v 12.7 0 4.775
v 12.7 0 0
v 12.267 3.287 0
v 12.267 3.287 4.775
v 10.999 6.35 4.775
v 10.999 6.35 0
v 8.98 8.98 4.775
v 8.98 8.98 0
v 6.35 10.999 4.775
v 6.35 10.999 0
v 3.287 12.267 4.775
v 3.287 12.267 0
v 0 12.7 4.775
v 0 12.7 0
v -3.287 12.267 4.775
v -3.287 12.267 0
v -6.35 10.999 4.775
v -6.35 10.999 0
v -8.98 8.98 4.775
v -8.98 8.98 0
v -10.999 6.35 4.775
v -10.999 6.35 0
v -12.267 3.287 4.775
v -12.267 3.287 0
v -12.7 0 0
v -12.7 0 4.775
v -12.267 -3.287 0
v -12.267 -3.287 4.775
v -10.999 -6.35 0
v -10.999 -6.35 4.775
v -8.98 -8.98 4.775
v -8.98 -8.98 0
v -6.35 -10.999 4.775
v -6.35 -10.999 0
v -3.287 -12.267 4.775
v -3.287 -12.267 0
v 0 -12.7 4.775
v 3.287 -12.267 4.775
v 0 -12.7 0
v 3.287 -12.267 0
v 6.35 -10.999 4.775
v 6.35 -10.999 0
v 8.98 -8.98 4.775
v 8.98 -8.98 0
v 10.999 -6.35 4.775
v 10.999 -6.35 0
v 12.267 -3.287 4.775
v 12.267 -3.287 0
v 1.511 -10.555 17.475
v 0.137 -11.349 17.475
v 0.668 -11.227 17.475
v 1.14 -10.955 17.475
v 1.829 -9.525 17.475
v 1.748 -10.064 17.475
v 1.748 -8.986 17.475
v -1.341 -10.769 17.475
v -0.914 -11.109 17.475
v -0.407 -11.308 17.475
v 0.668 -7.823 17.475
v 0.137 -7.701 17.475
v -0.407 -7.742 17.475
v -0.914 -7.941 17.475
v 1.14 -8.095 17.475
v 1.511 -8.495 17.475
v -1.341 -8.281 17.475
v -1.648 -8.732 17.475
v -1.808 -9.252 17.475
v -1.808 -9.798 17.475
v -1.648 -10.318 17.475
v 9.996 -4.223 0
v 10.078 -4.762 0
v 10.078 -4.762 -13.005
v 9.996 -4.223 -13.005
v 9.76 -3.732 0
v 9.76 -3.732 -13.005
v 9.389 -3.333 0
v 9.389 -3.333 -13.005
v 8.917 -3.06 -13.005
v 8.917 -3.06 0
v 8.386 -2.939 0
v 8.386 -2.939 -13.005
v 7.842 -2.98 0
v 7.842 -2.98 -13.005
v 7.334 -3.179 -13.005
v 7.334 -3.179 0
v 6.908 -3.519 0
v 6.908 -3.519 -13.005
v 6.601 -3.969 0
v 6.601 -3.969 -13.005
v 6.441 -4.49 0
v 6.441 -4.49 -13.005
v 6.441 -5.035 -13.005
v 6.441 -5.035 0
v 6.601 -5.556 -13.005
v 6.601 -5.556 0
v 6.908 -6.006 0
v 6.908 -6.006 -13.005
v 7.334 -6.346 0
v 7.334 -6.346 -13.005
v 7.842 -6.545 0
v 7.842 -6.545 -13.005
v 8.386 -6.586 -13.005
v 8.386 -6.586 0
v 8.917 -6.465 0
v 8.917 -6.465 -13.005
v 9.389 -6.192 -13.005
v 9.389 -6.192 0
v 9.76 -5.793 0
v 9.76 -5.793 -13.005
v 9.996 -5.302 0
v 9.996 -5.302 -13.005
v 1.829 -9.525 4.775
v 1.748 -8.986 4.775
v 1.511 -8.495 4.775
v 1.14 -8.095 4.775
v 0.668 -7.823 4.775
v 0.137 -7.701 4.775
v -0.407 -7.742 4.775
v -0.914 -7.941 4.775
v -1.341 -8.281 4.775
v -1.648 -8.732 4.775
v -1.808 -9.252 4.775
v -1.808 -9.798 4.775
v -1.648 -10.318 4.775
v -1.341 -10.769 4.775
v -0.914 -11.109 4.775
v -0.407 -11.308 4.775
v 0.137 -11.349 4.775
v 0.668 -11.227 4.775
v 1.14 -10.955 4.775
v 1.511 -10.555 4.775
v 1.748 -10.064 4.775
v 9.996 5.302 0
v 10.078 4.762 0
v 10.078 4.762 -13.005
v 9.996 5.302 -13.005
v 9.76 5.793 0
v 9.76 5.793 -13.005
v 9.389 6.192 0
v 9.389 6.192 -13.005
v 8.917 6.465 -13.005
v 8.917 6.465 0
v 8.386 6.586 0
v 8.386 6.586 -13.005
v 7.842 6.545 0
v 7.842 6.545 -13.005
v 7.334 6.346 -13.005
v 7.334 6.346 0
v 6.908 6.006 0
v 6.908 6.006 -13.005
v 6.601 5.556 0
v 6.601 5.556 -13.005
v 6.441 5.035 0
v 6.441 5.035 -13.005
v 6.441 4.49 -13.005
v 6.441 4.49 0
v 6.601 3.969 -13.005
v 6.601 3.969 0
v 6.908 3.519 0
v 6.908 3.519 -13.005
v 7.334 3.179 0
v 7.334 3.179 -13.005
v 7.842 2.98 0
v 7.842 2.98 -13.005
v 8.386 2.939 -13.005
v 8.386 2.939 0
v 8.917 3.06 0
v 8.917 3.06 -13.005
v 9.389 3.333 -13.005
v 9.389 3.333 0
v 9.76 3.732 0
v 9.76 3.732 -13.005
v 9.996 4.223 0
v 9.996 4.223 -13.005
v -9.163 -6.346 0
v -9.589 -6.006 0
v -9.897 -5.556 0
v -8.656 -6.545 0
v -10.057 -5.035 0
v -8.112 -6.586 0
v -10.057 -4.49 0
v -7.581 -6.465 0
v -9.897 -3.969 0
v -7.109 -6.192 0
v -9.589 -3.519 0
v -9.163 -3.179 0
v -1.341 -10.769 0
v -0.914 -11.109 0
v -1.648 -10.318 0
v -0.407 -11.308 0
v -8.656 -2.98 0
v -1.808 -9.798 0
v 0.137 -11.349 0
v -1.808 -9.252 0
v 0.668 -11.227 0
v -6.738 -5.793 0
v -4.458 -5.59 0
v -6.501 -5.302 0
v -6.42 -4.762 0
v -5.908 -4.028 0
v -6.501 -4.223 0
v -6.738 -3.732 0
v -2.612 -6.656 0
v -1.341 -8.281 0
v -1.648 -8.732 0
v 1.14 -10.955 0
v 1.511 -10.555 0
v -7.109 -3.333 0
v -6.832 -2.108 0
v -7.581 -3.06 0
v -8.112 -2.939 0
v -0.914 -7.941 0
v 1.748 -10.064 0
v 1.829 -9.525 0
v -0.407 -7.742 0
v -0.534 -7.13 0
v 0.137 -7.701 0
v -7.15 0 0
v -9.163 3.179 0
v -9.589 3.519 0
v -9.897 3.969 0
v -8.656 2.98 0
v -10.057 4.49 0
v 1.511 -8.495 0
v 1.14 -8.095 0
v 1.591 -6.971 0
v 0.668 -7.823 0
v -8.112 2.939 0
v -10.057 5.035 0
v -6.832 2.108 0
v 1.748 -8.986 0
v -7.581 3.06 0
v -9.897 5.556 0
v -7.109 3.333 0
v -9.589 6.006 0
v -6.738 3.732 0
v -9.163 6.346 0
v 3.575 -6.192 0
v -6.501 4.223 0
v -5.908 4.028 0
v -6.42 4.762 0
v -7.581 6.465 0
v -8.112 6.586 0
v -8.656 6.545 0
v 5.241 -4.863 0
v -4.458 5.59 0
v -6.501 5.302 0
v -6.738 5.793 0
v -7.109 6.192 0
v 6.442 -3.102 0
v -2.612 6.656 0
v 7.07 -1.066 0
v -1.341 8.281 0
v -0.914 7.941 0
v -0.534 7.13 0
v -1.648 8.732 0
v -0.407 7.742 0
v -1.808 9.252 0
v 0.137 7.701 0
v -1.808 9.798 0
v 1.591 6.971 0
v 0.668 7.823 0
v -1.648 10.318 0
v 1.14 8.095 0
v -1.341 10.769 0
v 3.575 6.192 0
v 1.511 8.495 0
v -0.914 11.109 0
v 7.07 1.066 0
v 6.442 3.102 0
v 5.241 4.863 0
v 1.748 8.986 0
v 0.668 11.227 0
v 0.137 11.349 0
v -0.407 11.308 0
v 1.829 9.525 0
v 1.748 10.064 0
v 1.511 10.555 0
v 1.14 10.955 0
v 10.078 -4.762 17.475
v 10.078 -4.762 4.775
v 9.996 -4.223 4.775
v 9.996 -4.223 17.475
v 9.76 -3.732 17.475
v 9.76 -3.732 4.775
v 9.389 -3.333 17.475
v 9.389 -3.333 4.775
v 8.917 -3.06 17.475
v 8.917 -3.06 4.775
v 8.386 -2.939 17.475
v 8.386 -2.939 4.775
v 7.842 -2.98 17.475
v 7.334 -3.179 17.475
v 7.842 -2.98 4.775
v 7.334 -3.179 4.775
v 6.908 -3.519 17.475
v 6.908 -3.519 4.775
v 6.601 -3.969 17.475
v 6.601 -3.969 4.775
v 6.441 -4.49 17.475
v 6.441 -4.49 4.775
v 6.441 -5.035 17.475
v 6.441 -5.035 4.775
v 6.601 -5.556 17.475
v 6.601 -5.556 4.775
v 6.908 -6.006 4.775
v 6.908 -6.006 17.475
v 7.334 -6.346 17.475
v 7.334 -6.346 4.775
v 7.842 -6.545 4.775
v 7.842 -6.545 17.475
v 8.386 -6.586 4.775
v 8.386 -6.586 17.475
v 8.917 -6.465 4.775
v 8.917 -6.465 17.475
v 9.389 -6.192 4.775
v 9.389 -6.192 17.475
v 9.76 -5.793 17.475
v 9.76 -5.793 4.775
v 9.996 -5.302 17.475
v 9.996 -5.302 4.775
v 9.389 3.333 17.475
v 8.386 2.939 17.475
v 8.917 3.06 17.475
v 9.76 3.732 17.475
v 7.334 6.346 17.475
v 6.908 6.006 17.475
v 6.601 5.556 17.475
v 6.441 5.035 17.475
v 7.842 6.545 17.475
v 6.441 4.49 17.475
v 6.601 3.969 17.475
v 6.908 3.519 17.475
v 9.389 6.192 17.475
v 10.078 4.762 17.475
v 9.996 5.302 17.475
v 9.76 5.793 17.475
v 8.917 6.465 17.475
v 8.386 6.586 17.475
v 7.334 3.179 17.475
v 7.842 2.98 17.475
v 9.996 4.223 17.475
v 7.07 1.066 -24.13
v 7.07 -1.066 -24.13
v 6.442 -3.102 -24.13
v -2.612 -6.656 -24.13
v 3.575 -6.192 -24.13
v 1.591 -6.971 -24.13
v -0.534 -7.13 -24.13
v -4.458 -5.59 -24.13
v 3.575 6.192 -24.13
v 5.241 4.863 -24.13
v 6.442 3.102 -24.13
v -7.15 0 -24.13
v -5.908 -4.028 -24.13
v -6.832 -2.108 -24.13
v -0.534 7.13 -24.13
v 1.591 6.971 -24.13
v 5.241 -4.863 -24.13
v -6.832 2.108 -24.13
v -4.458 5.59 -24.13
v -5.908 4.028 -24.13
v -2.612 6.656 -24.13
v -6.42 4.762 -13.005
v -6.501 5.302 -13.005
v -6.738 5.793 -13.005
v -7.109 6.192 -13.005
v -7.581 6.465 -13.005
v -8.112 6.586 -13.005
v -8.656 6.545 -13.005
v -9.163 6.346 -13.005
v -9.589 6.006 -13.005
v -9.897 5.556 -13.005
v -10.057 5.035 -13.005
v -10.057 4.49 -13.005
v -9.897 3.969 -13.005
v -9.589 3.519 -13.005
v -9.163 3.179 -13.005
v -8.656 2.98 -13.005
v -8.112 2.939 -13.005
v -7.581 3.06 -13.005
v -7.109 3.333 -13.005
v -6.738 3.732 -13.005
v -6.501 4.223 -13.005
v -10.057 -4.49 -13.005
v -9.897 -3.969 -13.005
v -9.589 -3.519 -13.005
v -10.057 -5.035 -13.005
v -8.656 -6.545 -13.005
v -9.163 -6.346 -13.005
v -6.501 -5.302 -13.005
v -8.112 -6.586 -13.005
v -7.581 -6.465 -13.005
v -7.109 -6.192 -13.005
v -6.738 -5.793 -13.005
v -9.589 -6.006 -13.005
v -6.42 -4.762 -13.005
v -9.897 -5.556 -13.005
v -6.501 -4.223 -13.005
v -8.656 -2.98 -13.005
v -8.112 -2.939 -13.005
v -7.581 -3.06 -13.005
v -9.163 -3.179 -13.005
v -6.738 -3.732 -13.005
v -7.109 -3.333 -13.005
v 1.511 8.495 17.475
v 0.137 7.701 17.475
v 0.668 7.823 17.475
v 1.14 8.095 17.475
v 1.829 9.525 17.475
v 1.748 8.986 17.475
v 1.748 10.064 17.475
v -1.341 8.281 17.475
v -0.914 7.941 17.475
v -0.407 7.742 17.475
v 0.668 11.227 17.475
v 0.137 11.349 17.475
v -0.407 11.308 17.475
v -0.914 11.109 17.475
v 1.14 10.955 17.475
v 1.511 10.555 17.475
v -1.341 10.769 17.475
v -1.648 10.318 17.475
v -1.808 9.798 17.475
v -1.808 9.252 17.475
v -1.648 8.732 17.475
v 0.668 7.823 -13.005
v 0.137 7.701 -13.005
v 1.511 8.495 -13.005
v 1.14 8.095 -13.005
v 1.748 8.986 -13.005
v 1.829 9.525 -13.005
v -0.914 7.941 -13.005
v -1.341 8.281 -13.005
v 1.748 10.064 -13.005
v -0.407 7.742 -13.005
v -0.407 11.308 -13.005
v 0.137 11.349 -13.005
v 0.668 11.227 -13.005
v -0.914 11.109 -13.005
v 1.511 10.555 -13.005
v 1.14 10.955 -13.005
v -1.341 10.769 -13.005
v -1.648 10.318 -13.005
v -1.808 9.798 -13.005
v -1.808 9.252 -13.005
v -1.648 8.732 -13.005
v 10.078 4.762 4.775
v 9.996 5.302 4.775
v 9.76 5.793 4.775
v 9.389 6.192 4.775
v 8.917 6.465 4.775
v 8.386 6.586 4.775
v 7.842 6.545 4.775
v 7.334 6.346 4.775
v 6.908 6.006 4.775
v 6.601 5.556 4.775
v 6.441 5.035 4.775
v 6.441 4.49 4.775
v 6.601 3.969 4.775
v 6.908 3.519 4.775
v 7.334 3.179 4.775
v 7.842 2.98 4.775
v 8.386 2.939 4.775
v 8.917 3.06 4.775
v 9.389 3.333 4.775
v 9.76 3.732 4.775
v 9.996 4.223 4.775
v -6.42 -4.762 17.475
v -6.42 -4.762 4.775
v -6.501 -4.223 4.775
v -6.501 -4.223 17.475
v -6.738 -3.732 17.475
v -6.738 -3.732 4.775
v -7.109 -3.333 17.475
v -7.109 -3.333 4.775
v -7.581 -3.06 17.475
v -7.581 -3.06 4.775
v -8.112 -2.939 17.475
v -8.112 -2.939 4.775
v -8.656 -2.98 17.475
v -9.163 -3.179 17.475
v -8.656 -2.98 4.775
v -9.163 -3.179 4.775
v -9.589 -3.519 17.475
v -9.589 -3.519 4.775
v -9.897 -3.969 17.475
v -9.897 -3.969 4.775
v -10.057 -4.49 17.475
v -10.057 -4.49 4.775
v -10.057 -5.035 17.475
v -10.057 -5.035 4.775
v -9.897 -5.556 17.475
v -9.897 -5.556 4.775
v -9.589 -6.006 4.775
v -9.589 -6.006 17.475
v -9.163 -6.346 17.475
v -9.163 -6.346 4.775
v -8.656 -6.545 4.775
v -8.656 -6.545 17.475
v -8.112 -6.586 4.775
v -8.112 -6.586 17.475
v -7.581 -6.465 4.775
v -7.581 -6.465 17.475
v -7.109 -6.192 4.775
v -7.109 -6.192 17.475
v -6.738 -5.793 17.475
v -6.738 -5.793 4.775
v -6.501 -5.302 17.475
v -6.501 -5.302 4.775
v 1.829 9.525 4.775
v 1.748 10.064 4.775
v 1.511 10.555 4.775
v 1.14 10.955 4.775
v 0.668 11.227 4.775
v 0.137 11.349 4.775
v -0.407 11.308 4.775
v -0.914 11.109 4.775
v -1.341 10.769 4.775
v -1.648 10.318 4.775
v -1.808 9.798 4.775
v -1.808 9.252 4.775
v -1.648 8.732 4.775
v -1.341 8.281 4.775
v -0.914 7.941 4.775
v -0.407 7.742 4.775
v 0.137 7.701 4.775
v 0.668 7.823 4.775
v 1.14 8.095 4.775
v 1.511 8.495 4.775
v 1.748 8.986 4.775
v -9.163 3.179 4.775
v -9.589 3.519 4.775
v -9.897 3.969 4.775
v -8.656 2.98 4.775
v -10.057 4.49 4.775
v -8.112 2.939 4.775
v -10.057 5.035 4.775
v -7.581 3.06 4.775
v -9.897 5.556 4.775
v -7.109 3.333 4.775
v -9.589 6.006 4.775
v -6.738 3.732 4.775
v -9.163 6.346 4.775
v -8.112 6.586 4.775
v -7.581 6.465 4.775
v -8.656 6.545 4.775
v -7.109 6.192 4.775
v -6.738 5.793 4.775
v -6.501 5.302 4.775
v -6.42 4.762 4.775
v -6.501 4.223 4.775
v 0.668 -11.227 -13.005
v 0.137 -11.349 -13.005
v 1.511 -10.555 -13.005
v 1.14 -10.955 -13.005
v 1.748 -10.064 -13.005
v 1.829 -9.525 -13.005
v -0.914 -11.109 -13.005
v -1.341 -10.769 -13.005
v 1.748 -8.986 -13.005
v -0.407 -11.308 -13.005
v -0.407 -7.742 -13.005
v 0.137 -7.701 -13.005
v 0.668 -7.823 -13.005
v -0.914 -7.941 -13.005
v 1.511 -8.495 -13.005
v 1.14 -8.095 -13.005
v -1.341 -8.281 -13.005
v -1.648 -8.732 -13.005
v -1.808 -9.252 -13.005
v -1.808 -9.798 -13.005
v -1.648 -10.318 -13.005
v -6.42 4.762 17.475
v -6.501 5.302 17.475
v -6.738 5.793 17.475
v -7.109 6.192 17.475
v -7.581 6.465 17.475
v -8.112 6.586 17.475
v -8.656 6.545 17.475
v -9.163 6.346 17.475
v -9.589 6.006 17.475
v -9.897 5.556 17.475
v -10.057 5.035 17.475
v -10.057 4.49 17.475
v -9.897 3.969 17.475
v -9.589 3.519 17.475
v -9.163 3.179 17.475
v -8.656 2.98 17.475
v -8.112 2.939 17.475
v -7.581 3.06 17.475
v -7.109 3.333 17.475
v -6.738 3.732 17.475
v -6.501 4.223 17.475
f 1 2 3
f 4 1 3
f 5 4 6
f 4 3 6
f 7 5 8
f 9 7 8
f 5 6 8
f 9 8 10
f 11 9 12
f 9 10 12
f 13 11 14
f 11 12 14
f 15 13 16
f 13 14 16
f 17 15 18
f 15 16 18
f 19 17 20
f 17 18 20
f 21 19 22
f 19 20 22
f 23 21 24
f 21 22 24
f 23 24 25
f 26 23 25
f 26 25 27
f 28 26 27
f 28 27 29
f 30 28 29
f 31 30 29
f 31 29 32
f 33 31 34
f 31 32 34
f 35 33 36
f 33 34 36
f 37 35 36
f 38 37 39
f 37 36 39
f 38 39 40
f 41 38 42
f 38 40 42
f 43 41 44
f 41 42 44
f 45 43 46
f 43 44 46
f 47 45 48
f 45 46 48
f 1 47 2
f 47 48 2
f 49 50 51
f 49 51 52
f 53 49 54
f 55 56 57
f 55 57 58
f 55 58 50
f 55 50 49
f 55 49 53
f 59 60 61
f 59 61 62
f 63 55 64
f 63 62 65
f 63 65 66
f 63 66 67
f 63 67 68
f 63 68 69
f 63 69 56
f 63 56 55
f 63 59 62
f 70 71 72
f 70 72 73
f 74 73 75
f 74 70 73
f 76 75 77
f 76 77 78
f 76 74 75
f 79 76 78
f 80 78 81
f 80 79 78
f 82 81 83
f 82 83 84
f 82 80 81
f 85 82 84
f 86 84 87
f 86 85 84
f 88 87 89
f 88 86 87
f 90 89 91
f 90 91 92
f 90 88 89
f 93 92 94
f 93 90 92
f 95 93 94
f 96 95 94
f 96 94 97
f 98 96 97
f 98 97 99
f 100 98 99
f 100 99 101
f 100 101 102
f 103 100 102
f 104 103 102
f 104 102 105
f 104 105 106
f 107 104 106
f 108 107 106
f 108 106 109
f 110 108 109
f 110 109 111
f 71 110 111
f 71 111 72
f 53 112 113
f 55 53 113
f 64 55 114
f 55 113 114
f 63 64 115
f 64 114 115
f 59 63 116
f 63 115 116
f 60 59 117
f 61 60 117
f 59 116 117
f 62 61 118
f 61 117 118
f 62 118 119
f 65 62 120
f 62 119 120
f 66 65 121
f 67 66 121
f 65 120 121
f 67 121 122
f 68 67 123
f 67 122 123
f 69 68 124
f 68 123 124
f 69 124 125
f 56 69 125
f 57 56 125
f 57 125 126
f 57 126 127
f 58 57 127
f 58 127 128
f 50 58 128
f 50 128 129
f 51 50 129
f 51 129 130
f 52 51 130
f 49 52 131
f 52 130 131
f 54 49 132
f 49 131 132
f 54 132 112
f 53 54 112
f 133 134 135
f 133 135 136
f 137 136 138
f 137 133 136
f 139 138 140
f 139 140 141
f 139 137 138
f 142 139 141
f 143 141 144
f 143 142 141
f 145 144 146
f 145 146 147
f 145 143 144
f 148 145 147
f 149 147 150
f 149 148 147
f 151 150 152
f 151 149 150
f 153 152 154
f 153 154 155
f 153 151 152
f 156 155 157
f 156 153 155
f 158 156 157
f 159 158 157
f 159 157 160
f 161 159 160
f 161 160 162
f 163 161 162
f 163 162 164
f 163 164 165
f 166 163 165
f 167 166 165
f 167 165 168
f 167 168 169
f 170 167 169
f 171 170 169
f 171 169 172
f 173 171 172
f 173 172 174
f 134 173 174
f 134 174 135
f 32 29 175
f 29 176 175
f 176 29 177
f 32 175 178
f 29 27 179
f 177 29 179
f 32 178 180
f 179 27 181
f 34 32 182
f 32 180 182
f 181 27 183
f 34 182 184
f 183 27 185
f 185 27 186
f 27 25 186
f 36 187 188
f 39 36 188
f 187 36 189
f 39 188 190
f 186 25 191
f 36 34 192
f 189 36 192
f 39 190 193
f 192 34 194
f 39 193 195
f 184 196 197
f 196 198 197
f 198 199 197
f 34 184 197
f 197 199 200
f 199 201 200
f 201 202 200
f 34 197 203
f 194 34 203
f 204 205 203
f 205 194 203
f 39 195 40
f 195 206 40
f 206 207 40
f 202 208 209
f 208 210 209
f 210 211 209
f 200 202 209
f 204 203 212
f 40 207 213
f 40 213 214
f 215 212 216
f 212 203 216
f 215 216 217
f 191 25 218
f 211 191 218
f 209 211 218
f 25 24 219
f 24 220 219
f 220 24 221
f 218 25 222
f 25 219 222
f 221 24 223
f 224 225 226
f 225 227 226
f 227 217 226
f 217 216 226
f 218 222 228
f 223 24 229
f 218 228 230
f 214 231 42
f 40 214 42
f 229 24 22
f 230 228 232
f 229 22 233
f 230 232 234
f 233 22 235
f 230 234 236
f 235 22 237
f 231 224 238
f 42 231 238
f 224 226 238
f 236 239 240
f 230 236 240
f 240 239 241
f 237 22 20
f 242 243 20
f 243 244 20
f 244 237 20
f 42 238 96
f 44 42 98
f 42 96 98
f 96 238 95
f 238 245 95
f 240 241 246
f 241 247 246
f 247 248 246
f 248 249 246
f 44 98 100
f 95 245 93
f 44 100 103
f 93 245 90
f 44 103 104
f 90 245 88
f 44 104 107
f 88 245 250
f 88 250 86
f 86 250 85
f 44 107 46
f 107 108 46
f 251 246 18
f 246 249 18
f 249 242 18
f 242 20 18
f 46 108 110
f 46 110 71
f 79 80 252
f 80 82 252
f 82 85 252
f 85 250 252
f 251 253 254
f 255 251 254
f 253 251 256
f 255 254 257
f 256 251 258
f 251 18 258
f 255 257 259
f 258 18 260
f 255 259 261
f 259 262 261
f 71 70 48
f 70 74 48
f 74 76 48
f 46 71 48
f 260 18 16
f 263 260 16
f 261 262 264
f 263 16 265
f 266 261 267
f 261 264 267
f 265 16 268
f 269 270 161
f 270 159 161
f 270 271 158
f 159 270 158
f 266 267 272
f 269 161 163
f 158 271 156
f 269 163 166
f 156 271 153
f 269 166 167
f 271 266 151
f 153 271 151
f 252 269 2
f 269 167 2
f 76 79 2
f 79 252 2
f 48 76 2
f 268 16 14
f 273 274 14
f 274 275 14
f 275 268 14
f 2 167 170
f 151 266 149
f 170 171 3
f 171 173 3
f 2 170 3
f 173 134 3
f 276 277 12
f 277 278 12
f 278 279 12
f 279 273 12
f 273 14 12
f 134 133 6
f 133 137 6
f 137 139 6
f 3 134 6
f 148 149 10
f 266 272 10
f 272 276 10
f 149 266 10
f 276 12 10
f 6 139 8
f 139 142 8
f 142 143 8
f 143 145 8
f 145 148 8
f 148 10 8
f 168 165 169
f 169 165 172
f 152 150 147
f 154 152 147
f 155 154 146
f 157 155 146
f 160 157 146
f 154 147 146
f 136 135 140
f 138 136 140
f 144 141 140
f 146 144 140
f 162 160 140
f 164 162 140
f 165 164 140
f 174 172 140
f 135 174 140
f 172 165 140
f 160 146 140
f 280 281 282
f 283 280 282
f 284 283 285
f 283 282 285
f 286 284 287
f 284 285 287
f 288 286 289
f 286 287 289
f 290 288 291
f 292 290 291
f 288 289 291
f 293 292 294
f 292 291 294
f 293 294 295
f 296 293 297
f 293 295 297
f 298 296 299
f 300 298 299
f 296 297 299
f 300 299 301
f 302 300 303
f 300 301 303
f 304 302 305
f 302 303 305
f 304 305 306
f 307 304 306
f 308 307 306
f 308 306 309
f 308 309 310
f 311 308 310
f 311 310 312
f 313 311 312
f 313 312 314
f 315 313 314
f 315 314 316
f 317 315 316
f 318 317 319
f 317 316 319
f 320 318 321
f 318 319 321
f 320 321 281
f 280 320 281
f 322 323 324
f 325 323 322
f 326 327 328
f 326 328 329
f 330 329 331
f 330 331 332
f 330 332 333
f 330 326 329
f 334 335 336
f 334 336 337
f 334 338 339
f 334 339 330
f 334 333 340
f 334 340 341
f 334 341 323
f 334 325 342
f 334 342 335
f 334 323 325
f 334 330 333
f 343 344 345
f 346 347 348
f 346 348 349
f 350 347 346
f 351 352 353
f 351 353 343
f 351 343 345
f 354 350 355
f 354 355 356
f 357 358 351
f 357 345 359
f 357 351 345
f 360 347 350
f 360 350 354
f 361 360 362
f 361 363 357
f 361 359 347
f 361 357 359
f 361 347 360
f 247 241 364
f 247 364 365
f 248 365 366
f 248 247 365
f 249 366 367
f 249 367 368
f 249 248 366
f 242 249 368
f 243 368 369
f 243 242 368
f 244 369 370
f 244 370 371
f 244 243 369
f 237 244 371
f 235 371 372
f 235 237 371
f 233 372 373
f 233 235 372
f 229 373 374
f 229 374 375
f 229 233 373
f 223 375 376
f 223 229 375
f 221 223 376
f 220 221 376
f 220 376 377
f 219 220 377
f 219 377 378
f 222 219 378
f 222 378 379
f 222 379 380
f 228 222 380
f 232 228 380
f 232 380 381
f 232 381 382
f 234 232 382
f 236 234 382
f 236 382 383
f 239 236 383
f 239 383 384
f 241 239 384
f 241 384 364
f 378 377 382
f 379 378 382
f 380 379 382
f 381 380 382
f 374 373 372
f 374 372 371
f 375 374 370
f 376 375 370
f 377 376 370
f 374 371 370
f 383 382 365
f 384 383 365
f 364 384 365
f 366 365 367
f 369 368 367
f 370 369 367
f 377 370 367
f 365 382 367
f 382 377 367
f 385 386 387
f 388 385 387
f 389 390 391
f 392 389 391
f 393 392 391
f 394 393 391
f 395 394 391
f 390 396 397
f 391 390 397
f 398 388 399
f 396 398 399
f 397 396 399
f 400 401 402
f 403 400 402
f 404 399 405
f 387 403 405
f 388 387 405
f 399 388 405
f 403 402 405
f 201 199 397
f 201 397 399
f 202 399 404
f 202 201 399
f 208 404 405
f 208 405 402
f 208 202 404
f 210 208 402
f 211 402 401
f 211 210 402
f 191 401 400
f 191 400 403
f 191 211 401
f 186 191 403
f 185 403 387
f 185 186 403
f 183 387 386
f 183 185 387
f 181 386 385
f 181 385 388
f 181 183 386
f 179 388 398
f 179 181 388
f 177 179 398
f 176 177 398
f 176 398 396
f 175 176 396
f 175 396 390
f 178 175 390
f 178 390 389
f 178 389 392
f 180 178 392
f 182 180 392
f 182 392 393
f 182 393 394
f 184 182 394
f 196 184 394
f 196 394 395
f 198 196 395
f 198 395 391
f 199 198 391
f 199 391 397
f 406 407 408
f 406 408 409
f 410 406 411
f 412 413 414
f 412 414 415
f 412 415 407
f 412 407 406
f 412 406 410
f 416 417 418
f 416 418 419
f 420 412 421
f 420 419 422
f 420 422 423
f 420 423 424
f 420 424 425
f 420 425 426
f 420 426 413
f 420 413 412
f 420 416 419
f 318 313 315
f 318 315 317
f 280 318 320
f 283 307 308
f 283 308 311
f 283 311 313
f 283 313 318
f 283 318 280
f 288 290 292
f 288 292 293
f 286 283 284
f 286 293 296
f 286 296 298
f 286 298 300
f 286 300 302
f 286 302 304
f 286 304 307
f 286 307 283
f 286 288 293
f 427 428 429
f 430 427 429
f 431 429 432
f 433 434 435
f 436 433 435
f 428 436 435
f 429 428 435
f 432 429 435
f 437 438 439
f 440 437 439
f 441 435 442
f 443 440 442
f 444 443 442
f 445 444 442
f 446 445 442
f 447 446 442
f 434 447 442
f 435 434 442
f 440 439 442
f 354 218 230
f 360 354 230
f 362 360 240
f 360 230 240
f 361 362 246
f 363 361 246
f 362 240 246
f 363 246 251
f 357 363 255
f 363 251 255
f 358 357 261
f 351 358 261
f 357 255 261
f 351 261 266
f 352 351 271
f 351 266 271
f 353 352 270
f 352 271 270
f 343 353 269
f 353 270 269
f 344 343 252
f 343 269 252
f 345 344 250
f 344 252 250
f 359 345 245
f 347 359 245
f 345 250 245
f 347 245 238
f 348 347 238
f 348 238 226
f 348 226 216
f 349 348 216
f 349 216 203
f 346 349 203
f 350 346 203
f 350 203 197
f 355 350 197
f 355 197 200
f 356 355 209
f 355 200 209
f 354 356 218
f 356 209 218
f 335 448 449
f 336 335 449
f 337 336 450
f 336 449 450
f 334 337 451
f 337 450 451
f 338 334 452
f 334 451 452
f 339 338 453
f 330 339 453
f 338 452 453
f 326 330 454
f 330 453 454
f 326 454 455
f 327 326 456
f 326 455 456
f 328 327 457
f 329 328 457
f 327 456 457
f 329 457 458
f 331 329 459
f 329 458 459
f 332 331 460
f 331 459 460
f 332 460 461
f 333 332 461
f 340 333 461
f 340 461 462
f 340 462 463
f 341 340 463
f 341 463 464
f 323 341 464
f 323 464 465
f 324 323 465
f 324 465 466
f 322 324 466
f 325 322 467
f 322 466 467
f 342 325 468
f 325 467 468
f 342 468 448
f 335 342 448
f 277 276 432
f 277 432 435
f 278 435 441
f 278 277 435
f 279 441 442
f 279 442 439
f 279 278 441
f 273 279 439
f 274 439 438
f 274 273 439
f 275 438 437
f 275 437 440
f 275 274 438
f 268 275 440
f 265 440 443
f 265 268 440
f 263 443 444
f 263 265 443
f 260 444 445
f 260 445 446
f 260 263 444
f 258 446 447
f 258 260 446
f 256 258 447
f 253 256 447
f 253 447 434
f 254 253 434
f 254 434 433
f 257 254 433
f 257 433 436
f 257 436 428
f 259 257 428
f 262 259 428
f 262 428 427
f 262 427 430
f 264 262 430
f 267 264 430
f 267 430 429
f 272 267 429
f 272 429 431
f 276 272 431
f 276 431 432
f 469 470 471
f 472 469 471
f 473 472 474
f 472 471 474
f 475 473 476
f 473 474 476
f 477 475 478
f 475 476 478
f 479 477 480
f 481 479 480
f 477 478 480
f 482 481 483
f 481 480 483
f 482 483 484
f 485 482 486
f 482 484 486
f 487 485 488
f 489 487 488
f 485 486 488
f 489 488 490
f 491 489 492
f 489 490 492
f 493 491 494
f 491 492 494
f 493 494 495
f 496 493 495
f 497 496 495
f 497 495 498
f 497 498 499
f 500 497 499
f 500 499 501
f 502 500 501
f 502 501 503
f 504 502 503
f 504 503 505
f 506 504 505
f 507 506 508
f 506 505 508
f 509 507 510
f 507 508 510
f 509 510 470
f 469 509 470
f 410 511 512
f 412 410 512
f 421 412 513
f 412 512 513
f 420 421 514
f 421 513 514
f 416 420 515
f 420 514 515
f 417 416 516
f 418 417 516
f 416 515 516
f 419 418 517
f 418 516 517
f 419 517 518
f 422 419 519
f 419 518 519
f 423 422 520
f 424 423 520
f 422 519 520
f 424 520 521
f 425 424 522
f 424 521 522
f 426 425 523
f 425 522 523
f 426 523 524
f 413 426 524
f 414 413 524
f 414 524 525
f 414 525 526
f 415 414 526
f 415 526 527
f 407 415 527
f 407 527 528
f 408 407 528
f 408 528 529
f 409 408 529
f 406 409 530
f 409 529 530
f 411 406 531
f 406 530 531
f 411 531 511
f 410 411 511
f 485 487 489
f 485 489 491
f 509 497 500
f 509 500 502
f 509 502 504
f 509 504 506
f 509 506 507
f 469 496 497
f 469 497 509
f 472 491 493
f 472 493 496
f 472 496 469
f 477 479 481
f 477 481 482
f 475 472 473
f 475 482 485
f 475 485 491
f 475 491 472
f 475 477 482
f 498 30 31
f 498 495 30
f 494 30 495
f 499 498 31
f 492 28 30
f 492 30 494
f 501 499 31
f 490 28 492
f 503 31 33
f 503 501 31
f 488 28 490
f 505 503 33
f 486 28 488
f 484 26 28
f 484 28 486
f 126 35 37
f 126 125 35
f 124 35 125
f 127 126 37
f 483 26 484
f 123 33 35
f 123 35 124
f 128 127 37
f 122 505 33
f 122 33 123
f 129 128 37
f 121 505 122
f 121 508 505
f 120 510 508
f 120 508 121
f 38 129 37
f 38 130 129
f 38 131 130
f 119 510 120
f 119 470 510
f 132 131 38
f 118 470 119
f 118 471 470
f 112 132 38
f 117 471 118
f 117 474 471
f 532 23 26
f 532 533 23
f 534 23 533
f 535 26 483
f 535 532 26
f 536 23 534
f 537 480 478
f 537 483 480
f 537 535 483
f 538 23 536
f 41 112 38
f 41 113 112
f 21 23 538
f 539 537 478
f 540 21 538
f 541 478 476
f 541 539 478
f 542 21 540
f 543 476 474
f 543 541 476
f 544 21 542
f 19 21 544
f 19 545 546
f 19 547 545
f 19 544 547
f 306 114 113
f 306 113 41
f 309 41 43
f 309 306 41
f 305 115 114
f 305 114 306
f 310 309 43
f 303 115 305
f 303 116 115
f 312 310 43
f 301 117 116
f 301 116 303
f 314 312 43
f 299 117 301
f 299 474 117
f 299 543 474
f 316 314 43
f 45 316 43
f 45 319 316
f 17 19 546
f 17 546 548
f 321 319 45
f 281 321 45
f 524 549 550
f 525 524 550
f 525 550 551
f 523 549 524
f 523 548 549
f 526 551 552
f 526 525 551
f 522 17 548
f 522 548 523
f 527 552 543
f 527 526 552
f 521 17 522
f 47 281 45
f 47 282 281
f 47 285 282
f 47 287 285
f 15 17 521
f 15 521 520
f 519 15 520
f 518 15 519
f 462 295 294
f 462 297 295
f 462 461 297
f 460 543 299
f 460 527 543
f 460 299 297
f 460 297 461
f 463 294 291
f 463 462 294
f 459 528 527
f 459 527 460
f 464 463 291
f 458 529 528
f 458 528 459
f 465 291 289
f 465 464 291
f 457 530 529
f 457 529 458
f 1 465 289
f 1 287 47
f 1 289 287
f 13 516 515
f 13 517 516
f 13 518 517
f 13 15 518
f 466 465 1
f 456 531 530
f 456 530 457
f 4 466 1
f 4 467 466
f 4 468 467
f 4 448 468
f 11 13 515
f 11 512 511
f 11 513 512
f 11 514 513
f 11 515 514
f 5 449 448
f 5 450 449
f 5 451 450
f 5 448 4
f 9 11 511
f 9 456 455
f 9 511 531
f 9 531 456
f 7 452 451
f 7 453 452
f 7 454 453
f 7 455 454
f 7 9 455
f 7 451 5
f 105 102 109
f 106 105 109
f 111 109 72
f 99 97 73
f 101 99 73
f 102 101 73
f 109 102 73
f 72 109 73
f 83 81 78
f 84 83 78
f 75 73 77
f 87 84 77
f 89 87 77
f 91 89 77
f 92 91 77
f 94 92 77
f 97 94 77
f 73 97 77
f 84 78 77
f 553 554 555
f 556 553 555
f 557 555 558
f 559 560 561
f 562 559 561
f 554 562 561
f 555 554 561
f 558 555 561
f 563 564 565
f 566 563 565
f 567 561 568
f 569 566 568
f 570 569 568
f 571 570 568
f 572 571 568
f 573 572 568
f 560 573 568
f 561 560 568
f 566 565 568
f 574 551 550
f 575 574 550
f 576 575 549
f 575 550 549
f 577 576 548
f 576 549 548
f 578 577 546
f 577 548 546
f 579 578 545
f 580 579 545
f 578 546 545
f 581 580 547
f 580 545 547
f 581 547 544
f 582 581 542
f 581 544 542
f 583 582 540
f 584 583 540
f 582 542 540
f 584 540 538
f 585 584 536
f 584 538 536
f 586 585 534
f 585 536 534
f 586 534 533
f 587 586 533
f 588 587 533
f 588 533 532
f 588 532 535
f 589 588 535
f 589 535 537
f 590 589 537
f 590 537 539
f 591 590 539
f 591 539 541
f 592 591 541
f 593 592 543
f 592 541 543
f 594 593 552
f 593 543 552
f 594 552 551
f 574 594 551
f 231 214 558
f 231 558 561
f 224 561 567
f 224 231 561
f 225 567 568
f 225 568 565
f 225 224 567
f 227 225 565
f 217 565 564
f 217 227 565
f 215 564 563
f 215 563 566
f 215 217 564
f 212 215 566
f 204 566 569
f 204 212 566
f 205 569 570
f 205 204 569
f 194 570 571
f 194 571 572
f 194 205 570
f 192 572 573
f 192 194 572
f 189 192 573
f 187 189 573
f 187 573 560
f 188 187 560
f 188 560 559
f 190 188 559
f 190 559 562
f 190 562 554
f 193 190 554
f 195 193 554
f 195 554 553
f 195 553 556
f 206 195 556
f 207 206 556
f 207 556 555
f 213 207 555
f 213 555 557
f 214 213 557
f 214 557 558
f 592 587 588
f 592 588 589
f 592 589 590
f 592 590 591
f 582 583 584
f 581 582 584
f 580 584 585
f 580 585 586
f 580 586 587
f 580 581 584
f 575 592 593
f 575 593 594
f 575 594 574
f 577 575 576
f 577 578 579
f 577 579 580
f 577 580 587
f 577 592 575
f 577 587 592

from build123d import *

# Parameters (mm, degrees)
SKETCH1_R                = 12.7
BOSS_EXTRUDE1_DEPTH      = 4.7752
SKETCH2_R                = 7.1501
BOSS_EXTRUDE2_DEPTH      = 24.13
SKETCH3_R                = 1.8288
BOSS_EXTRUDE3_DEPTH      = 12.7
BOSS_EXTRUDE3_DEPTH_BACK = 17.78


with BuildPart() as part:
    # Sketch1 → Boss-Extrude1 (new body)
    with BuildSketch(Plane.XY):
        Circle(SKETCH1_R)
    extrude(amount=BOSS_EXTRUDE1_DEPTH)

    # Sketch2 → Boss-Extrude2 (add)
    with BuildSketch(Plane(origin=(0, 0, 0), x_dir=(-1, 0, 0), z_dir=(0, 0, -1))):
        Circle(SKETCH2_R)
    extrude(amount=BOSS_EXTRUDE2_DEPTH)

    # Sketch3 → Boss-Extrude3 (add, two sides)
    with BuildSketch(Plane.XY.offset(4.7752)) as boss_extrude3_sk:
        with Locations((0, 9.525)):
            Circle(SKETCH3_R)
        with Locations((8.248891971, 4.7625)):
            Circle(SKETCH3_R)
        with Locations((8.248891971, -4.7625)):
            Circle(SKETCH3_R)
        with Locations((0, -9.525)):
            Circle(SKETCH3_R)
        with Locations((-8.248891971, -4.7625)):
            Circle(SKETCH3_R)
        with Locations((-8.248891971, 4.7625)):
            Circle(SKETCH3_R)
    extrude(amount=BOSS_EXTRUDE3_DEPTH)
    extrude(boss_extrude3_sk.sketch, amount=-BOSS_EXTRUDE3_DEPTH_BACK)


solid = part.part
